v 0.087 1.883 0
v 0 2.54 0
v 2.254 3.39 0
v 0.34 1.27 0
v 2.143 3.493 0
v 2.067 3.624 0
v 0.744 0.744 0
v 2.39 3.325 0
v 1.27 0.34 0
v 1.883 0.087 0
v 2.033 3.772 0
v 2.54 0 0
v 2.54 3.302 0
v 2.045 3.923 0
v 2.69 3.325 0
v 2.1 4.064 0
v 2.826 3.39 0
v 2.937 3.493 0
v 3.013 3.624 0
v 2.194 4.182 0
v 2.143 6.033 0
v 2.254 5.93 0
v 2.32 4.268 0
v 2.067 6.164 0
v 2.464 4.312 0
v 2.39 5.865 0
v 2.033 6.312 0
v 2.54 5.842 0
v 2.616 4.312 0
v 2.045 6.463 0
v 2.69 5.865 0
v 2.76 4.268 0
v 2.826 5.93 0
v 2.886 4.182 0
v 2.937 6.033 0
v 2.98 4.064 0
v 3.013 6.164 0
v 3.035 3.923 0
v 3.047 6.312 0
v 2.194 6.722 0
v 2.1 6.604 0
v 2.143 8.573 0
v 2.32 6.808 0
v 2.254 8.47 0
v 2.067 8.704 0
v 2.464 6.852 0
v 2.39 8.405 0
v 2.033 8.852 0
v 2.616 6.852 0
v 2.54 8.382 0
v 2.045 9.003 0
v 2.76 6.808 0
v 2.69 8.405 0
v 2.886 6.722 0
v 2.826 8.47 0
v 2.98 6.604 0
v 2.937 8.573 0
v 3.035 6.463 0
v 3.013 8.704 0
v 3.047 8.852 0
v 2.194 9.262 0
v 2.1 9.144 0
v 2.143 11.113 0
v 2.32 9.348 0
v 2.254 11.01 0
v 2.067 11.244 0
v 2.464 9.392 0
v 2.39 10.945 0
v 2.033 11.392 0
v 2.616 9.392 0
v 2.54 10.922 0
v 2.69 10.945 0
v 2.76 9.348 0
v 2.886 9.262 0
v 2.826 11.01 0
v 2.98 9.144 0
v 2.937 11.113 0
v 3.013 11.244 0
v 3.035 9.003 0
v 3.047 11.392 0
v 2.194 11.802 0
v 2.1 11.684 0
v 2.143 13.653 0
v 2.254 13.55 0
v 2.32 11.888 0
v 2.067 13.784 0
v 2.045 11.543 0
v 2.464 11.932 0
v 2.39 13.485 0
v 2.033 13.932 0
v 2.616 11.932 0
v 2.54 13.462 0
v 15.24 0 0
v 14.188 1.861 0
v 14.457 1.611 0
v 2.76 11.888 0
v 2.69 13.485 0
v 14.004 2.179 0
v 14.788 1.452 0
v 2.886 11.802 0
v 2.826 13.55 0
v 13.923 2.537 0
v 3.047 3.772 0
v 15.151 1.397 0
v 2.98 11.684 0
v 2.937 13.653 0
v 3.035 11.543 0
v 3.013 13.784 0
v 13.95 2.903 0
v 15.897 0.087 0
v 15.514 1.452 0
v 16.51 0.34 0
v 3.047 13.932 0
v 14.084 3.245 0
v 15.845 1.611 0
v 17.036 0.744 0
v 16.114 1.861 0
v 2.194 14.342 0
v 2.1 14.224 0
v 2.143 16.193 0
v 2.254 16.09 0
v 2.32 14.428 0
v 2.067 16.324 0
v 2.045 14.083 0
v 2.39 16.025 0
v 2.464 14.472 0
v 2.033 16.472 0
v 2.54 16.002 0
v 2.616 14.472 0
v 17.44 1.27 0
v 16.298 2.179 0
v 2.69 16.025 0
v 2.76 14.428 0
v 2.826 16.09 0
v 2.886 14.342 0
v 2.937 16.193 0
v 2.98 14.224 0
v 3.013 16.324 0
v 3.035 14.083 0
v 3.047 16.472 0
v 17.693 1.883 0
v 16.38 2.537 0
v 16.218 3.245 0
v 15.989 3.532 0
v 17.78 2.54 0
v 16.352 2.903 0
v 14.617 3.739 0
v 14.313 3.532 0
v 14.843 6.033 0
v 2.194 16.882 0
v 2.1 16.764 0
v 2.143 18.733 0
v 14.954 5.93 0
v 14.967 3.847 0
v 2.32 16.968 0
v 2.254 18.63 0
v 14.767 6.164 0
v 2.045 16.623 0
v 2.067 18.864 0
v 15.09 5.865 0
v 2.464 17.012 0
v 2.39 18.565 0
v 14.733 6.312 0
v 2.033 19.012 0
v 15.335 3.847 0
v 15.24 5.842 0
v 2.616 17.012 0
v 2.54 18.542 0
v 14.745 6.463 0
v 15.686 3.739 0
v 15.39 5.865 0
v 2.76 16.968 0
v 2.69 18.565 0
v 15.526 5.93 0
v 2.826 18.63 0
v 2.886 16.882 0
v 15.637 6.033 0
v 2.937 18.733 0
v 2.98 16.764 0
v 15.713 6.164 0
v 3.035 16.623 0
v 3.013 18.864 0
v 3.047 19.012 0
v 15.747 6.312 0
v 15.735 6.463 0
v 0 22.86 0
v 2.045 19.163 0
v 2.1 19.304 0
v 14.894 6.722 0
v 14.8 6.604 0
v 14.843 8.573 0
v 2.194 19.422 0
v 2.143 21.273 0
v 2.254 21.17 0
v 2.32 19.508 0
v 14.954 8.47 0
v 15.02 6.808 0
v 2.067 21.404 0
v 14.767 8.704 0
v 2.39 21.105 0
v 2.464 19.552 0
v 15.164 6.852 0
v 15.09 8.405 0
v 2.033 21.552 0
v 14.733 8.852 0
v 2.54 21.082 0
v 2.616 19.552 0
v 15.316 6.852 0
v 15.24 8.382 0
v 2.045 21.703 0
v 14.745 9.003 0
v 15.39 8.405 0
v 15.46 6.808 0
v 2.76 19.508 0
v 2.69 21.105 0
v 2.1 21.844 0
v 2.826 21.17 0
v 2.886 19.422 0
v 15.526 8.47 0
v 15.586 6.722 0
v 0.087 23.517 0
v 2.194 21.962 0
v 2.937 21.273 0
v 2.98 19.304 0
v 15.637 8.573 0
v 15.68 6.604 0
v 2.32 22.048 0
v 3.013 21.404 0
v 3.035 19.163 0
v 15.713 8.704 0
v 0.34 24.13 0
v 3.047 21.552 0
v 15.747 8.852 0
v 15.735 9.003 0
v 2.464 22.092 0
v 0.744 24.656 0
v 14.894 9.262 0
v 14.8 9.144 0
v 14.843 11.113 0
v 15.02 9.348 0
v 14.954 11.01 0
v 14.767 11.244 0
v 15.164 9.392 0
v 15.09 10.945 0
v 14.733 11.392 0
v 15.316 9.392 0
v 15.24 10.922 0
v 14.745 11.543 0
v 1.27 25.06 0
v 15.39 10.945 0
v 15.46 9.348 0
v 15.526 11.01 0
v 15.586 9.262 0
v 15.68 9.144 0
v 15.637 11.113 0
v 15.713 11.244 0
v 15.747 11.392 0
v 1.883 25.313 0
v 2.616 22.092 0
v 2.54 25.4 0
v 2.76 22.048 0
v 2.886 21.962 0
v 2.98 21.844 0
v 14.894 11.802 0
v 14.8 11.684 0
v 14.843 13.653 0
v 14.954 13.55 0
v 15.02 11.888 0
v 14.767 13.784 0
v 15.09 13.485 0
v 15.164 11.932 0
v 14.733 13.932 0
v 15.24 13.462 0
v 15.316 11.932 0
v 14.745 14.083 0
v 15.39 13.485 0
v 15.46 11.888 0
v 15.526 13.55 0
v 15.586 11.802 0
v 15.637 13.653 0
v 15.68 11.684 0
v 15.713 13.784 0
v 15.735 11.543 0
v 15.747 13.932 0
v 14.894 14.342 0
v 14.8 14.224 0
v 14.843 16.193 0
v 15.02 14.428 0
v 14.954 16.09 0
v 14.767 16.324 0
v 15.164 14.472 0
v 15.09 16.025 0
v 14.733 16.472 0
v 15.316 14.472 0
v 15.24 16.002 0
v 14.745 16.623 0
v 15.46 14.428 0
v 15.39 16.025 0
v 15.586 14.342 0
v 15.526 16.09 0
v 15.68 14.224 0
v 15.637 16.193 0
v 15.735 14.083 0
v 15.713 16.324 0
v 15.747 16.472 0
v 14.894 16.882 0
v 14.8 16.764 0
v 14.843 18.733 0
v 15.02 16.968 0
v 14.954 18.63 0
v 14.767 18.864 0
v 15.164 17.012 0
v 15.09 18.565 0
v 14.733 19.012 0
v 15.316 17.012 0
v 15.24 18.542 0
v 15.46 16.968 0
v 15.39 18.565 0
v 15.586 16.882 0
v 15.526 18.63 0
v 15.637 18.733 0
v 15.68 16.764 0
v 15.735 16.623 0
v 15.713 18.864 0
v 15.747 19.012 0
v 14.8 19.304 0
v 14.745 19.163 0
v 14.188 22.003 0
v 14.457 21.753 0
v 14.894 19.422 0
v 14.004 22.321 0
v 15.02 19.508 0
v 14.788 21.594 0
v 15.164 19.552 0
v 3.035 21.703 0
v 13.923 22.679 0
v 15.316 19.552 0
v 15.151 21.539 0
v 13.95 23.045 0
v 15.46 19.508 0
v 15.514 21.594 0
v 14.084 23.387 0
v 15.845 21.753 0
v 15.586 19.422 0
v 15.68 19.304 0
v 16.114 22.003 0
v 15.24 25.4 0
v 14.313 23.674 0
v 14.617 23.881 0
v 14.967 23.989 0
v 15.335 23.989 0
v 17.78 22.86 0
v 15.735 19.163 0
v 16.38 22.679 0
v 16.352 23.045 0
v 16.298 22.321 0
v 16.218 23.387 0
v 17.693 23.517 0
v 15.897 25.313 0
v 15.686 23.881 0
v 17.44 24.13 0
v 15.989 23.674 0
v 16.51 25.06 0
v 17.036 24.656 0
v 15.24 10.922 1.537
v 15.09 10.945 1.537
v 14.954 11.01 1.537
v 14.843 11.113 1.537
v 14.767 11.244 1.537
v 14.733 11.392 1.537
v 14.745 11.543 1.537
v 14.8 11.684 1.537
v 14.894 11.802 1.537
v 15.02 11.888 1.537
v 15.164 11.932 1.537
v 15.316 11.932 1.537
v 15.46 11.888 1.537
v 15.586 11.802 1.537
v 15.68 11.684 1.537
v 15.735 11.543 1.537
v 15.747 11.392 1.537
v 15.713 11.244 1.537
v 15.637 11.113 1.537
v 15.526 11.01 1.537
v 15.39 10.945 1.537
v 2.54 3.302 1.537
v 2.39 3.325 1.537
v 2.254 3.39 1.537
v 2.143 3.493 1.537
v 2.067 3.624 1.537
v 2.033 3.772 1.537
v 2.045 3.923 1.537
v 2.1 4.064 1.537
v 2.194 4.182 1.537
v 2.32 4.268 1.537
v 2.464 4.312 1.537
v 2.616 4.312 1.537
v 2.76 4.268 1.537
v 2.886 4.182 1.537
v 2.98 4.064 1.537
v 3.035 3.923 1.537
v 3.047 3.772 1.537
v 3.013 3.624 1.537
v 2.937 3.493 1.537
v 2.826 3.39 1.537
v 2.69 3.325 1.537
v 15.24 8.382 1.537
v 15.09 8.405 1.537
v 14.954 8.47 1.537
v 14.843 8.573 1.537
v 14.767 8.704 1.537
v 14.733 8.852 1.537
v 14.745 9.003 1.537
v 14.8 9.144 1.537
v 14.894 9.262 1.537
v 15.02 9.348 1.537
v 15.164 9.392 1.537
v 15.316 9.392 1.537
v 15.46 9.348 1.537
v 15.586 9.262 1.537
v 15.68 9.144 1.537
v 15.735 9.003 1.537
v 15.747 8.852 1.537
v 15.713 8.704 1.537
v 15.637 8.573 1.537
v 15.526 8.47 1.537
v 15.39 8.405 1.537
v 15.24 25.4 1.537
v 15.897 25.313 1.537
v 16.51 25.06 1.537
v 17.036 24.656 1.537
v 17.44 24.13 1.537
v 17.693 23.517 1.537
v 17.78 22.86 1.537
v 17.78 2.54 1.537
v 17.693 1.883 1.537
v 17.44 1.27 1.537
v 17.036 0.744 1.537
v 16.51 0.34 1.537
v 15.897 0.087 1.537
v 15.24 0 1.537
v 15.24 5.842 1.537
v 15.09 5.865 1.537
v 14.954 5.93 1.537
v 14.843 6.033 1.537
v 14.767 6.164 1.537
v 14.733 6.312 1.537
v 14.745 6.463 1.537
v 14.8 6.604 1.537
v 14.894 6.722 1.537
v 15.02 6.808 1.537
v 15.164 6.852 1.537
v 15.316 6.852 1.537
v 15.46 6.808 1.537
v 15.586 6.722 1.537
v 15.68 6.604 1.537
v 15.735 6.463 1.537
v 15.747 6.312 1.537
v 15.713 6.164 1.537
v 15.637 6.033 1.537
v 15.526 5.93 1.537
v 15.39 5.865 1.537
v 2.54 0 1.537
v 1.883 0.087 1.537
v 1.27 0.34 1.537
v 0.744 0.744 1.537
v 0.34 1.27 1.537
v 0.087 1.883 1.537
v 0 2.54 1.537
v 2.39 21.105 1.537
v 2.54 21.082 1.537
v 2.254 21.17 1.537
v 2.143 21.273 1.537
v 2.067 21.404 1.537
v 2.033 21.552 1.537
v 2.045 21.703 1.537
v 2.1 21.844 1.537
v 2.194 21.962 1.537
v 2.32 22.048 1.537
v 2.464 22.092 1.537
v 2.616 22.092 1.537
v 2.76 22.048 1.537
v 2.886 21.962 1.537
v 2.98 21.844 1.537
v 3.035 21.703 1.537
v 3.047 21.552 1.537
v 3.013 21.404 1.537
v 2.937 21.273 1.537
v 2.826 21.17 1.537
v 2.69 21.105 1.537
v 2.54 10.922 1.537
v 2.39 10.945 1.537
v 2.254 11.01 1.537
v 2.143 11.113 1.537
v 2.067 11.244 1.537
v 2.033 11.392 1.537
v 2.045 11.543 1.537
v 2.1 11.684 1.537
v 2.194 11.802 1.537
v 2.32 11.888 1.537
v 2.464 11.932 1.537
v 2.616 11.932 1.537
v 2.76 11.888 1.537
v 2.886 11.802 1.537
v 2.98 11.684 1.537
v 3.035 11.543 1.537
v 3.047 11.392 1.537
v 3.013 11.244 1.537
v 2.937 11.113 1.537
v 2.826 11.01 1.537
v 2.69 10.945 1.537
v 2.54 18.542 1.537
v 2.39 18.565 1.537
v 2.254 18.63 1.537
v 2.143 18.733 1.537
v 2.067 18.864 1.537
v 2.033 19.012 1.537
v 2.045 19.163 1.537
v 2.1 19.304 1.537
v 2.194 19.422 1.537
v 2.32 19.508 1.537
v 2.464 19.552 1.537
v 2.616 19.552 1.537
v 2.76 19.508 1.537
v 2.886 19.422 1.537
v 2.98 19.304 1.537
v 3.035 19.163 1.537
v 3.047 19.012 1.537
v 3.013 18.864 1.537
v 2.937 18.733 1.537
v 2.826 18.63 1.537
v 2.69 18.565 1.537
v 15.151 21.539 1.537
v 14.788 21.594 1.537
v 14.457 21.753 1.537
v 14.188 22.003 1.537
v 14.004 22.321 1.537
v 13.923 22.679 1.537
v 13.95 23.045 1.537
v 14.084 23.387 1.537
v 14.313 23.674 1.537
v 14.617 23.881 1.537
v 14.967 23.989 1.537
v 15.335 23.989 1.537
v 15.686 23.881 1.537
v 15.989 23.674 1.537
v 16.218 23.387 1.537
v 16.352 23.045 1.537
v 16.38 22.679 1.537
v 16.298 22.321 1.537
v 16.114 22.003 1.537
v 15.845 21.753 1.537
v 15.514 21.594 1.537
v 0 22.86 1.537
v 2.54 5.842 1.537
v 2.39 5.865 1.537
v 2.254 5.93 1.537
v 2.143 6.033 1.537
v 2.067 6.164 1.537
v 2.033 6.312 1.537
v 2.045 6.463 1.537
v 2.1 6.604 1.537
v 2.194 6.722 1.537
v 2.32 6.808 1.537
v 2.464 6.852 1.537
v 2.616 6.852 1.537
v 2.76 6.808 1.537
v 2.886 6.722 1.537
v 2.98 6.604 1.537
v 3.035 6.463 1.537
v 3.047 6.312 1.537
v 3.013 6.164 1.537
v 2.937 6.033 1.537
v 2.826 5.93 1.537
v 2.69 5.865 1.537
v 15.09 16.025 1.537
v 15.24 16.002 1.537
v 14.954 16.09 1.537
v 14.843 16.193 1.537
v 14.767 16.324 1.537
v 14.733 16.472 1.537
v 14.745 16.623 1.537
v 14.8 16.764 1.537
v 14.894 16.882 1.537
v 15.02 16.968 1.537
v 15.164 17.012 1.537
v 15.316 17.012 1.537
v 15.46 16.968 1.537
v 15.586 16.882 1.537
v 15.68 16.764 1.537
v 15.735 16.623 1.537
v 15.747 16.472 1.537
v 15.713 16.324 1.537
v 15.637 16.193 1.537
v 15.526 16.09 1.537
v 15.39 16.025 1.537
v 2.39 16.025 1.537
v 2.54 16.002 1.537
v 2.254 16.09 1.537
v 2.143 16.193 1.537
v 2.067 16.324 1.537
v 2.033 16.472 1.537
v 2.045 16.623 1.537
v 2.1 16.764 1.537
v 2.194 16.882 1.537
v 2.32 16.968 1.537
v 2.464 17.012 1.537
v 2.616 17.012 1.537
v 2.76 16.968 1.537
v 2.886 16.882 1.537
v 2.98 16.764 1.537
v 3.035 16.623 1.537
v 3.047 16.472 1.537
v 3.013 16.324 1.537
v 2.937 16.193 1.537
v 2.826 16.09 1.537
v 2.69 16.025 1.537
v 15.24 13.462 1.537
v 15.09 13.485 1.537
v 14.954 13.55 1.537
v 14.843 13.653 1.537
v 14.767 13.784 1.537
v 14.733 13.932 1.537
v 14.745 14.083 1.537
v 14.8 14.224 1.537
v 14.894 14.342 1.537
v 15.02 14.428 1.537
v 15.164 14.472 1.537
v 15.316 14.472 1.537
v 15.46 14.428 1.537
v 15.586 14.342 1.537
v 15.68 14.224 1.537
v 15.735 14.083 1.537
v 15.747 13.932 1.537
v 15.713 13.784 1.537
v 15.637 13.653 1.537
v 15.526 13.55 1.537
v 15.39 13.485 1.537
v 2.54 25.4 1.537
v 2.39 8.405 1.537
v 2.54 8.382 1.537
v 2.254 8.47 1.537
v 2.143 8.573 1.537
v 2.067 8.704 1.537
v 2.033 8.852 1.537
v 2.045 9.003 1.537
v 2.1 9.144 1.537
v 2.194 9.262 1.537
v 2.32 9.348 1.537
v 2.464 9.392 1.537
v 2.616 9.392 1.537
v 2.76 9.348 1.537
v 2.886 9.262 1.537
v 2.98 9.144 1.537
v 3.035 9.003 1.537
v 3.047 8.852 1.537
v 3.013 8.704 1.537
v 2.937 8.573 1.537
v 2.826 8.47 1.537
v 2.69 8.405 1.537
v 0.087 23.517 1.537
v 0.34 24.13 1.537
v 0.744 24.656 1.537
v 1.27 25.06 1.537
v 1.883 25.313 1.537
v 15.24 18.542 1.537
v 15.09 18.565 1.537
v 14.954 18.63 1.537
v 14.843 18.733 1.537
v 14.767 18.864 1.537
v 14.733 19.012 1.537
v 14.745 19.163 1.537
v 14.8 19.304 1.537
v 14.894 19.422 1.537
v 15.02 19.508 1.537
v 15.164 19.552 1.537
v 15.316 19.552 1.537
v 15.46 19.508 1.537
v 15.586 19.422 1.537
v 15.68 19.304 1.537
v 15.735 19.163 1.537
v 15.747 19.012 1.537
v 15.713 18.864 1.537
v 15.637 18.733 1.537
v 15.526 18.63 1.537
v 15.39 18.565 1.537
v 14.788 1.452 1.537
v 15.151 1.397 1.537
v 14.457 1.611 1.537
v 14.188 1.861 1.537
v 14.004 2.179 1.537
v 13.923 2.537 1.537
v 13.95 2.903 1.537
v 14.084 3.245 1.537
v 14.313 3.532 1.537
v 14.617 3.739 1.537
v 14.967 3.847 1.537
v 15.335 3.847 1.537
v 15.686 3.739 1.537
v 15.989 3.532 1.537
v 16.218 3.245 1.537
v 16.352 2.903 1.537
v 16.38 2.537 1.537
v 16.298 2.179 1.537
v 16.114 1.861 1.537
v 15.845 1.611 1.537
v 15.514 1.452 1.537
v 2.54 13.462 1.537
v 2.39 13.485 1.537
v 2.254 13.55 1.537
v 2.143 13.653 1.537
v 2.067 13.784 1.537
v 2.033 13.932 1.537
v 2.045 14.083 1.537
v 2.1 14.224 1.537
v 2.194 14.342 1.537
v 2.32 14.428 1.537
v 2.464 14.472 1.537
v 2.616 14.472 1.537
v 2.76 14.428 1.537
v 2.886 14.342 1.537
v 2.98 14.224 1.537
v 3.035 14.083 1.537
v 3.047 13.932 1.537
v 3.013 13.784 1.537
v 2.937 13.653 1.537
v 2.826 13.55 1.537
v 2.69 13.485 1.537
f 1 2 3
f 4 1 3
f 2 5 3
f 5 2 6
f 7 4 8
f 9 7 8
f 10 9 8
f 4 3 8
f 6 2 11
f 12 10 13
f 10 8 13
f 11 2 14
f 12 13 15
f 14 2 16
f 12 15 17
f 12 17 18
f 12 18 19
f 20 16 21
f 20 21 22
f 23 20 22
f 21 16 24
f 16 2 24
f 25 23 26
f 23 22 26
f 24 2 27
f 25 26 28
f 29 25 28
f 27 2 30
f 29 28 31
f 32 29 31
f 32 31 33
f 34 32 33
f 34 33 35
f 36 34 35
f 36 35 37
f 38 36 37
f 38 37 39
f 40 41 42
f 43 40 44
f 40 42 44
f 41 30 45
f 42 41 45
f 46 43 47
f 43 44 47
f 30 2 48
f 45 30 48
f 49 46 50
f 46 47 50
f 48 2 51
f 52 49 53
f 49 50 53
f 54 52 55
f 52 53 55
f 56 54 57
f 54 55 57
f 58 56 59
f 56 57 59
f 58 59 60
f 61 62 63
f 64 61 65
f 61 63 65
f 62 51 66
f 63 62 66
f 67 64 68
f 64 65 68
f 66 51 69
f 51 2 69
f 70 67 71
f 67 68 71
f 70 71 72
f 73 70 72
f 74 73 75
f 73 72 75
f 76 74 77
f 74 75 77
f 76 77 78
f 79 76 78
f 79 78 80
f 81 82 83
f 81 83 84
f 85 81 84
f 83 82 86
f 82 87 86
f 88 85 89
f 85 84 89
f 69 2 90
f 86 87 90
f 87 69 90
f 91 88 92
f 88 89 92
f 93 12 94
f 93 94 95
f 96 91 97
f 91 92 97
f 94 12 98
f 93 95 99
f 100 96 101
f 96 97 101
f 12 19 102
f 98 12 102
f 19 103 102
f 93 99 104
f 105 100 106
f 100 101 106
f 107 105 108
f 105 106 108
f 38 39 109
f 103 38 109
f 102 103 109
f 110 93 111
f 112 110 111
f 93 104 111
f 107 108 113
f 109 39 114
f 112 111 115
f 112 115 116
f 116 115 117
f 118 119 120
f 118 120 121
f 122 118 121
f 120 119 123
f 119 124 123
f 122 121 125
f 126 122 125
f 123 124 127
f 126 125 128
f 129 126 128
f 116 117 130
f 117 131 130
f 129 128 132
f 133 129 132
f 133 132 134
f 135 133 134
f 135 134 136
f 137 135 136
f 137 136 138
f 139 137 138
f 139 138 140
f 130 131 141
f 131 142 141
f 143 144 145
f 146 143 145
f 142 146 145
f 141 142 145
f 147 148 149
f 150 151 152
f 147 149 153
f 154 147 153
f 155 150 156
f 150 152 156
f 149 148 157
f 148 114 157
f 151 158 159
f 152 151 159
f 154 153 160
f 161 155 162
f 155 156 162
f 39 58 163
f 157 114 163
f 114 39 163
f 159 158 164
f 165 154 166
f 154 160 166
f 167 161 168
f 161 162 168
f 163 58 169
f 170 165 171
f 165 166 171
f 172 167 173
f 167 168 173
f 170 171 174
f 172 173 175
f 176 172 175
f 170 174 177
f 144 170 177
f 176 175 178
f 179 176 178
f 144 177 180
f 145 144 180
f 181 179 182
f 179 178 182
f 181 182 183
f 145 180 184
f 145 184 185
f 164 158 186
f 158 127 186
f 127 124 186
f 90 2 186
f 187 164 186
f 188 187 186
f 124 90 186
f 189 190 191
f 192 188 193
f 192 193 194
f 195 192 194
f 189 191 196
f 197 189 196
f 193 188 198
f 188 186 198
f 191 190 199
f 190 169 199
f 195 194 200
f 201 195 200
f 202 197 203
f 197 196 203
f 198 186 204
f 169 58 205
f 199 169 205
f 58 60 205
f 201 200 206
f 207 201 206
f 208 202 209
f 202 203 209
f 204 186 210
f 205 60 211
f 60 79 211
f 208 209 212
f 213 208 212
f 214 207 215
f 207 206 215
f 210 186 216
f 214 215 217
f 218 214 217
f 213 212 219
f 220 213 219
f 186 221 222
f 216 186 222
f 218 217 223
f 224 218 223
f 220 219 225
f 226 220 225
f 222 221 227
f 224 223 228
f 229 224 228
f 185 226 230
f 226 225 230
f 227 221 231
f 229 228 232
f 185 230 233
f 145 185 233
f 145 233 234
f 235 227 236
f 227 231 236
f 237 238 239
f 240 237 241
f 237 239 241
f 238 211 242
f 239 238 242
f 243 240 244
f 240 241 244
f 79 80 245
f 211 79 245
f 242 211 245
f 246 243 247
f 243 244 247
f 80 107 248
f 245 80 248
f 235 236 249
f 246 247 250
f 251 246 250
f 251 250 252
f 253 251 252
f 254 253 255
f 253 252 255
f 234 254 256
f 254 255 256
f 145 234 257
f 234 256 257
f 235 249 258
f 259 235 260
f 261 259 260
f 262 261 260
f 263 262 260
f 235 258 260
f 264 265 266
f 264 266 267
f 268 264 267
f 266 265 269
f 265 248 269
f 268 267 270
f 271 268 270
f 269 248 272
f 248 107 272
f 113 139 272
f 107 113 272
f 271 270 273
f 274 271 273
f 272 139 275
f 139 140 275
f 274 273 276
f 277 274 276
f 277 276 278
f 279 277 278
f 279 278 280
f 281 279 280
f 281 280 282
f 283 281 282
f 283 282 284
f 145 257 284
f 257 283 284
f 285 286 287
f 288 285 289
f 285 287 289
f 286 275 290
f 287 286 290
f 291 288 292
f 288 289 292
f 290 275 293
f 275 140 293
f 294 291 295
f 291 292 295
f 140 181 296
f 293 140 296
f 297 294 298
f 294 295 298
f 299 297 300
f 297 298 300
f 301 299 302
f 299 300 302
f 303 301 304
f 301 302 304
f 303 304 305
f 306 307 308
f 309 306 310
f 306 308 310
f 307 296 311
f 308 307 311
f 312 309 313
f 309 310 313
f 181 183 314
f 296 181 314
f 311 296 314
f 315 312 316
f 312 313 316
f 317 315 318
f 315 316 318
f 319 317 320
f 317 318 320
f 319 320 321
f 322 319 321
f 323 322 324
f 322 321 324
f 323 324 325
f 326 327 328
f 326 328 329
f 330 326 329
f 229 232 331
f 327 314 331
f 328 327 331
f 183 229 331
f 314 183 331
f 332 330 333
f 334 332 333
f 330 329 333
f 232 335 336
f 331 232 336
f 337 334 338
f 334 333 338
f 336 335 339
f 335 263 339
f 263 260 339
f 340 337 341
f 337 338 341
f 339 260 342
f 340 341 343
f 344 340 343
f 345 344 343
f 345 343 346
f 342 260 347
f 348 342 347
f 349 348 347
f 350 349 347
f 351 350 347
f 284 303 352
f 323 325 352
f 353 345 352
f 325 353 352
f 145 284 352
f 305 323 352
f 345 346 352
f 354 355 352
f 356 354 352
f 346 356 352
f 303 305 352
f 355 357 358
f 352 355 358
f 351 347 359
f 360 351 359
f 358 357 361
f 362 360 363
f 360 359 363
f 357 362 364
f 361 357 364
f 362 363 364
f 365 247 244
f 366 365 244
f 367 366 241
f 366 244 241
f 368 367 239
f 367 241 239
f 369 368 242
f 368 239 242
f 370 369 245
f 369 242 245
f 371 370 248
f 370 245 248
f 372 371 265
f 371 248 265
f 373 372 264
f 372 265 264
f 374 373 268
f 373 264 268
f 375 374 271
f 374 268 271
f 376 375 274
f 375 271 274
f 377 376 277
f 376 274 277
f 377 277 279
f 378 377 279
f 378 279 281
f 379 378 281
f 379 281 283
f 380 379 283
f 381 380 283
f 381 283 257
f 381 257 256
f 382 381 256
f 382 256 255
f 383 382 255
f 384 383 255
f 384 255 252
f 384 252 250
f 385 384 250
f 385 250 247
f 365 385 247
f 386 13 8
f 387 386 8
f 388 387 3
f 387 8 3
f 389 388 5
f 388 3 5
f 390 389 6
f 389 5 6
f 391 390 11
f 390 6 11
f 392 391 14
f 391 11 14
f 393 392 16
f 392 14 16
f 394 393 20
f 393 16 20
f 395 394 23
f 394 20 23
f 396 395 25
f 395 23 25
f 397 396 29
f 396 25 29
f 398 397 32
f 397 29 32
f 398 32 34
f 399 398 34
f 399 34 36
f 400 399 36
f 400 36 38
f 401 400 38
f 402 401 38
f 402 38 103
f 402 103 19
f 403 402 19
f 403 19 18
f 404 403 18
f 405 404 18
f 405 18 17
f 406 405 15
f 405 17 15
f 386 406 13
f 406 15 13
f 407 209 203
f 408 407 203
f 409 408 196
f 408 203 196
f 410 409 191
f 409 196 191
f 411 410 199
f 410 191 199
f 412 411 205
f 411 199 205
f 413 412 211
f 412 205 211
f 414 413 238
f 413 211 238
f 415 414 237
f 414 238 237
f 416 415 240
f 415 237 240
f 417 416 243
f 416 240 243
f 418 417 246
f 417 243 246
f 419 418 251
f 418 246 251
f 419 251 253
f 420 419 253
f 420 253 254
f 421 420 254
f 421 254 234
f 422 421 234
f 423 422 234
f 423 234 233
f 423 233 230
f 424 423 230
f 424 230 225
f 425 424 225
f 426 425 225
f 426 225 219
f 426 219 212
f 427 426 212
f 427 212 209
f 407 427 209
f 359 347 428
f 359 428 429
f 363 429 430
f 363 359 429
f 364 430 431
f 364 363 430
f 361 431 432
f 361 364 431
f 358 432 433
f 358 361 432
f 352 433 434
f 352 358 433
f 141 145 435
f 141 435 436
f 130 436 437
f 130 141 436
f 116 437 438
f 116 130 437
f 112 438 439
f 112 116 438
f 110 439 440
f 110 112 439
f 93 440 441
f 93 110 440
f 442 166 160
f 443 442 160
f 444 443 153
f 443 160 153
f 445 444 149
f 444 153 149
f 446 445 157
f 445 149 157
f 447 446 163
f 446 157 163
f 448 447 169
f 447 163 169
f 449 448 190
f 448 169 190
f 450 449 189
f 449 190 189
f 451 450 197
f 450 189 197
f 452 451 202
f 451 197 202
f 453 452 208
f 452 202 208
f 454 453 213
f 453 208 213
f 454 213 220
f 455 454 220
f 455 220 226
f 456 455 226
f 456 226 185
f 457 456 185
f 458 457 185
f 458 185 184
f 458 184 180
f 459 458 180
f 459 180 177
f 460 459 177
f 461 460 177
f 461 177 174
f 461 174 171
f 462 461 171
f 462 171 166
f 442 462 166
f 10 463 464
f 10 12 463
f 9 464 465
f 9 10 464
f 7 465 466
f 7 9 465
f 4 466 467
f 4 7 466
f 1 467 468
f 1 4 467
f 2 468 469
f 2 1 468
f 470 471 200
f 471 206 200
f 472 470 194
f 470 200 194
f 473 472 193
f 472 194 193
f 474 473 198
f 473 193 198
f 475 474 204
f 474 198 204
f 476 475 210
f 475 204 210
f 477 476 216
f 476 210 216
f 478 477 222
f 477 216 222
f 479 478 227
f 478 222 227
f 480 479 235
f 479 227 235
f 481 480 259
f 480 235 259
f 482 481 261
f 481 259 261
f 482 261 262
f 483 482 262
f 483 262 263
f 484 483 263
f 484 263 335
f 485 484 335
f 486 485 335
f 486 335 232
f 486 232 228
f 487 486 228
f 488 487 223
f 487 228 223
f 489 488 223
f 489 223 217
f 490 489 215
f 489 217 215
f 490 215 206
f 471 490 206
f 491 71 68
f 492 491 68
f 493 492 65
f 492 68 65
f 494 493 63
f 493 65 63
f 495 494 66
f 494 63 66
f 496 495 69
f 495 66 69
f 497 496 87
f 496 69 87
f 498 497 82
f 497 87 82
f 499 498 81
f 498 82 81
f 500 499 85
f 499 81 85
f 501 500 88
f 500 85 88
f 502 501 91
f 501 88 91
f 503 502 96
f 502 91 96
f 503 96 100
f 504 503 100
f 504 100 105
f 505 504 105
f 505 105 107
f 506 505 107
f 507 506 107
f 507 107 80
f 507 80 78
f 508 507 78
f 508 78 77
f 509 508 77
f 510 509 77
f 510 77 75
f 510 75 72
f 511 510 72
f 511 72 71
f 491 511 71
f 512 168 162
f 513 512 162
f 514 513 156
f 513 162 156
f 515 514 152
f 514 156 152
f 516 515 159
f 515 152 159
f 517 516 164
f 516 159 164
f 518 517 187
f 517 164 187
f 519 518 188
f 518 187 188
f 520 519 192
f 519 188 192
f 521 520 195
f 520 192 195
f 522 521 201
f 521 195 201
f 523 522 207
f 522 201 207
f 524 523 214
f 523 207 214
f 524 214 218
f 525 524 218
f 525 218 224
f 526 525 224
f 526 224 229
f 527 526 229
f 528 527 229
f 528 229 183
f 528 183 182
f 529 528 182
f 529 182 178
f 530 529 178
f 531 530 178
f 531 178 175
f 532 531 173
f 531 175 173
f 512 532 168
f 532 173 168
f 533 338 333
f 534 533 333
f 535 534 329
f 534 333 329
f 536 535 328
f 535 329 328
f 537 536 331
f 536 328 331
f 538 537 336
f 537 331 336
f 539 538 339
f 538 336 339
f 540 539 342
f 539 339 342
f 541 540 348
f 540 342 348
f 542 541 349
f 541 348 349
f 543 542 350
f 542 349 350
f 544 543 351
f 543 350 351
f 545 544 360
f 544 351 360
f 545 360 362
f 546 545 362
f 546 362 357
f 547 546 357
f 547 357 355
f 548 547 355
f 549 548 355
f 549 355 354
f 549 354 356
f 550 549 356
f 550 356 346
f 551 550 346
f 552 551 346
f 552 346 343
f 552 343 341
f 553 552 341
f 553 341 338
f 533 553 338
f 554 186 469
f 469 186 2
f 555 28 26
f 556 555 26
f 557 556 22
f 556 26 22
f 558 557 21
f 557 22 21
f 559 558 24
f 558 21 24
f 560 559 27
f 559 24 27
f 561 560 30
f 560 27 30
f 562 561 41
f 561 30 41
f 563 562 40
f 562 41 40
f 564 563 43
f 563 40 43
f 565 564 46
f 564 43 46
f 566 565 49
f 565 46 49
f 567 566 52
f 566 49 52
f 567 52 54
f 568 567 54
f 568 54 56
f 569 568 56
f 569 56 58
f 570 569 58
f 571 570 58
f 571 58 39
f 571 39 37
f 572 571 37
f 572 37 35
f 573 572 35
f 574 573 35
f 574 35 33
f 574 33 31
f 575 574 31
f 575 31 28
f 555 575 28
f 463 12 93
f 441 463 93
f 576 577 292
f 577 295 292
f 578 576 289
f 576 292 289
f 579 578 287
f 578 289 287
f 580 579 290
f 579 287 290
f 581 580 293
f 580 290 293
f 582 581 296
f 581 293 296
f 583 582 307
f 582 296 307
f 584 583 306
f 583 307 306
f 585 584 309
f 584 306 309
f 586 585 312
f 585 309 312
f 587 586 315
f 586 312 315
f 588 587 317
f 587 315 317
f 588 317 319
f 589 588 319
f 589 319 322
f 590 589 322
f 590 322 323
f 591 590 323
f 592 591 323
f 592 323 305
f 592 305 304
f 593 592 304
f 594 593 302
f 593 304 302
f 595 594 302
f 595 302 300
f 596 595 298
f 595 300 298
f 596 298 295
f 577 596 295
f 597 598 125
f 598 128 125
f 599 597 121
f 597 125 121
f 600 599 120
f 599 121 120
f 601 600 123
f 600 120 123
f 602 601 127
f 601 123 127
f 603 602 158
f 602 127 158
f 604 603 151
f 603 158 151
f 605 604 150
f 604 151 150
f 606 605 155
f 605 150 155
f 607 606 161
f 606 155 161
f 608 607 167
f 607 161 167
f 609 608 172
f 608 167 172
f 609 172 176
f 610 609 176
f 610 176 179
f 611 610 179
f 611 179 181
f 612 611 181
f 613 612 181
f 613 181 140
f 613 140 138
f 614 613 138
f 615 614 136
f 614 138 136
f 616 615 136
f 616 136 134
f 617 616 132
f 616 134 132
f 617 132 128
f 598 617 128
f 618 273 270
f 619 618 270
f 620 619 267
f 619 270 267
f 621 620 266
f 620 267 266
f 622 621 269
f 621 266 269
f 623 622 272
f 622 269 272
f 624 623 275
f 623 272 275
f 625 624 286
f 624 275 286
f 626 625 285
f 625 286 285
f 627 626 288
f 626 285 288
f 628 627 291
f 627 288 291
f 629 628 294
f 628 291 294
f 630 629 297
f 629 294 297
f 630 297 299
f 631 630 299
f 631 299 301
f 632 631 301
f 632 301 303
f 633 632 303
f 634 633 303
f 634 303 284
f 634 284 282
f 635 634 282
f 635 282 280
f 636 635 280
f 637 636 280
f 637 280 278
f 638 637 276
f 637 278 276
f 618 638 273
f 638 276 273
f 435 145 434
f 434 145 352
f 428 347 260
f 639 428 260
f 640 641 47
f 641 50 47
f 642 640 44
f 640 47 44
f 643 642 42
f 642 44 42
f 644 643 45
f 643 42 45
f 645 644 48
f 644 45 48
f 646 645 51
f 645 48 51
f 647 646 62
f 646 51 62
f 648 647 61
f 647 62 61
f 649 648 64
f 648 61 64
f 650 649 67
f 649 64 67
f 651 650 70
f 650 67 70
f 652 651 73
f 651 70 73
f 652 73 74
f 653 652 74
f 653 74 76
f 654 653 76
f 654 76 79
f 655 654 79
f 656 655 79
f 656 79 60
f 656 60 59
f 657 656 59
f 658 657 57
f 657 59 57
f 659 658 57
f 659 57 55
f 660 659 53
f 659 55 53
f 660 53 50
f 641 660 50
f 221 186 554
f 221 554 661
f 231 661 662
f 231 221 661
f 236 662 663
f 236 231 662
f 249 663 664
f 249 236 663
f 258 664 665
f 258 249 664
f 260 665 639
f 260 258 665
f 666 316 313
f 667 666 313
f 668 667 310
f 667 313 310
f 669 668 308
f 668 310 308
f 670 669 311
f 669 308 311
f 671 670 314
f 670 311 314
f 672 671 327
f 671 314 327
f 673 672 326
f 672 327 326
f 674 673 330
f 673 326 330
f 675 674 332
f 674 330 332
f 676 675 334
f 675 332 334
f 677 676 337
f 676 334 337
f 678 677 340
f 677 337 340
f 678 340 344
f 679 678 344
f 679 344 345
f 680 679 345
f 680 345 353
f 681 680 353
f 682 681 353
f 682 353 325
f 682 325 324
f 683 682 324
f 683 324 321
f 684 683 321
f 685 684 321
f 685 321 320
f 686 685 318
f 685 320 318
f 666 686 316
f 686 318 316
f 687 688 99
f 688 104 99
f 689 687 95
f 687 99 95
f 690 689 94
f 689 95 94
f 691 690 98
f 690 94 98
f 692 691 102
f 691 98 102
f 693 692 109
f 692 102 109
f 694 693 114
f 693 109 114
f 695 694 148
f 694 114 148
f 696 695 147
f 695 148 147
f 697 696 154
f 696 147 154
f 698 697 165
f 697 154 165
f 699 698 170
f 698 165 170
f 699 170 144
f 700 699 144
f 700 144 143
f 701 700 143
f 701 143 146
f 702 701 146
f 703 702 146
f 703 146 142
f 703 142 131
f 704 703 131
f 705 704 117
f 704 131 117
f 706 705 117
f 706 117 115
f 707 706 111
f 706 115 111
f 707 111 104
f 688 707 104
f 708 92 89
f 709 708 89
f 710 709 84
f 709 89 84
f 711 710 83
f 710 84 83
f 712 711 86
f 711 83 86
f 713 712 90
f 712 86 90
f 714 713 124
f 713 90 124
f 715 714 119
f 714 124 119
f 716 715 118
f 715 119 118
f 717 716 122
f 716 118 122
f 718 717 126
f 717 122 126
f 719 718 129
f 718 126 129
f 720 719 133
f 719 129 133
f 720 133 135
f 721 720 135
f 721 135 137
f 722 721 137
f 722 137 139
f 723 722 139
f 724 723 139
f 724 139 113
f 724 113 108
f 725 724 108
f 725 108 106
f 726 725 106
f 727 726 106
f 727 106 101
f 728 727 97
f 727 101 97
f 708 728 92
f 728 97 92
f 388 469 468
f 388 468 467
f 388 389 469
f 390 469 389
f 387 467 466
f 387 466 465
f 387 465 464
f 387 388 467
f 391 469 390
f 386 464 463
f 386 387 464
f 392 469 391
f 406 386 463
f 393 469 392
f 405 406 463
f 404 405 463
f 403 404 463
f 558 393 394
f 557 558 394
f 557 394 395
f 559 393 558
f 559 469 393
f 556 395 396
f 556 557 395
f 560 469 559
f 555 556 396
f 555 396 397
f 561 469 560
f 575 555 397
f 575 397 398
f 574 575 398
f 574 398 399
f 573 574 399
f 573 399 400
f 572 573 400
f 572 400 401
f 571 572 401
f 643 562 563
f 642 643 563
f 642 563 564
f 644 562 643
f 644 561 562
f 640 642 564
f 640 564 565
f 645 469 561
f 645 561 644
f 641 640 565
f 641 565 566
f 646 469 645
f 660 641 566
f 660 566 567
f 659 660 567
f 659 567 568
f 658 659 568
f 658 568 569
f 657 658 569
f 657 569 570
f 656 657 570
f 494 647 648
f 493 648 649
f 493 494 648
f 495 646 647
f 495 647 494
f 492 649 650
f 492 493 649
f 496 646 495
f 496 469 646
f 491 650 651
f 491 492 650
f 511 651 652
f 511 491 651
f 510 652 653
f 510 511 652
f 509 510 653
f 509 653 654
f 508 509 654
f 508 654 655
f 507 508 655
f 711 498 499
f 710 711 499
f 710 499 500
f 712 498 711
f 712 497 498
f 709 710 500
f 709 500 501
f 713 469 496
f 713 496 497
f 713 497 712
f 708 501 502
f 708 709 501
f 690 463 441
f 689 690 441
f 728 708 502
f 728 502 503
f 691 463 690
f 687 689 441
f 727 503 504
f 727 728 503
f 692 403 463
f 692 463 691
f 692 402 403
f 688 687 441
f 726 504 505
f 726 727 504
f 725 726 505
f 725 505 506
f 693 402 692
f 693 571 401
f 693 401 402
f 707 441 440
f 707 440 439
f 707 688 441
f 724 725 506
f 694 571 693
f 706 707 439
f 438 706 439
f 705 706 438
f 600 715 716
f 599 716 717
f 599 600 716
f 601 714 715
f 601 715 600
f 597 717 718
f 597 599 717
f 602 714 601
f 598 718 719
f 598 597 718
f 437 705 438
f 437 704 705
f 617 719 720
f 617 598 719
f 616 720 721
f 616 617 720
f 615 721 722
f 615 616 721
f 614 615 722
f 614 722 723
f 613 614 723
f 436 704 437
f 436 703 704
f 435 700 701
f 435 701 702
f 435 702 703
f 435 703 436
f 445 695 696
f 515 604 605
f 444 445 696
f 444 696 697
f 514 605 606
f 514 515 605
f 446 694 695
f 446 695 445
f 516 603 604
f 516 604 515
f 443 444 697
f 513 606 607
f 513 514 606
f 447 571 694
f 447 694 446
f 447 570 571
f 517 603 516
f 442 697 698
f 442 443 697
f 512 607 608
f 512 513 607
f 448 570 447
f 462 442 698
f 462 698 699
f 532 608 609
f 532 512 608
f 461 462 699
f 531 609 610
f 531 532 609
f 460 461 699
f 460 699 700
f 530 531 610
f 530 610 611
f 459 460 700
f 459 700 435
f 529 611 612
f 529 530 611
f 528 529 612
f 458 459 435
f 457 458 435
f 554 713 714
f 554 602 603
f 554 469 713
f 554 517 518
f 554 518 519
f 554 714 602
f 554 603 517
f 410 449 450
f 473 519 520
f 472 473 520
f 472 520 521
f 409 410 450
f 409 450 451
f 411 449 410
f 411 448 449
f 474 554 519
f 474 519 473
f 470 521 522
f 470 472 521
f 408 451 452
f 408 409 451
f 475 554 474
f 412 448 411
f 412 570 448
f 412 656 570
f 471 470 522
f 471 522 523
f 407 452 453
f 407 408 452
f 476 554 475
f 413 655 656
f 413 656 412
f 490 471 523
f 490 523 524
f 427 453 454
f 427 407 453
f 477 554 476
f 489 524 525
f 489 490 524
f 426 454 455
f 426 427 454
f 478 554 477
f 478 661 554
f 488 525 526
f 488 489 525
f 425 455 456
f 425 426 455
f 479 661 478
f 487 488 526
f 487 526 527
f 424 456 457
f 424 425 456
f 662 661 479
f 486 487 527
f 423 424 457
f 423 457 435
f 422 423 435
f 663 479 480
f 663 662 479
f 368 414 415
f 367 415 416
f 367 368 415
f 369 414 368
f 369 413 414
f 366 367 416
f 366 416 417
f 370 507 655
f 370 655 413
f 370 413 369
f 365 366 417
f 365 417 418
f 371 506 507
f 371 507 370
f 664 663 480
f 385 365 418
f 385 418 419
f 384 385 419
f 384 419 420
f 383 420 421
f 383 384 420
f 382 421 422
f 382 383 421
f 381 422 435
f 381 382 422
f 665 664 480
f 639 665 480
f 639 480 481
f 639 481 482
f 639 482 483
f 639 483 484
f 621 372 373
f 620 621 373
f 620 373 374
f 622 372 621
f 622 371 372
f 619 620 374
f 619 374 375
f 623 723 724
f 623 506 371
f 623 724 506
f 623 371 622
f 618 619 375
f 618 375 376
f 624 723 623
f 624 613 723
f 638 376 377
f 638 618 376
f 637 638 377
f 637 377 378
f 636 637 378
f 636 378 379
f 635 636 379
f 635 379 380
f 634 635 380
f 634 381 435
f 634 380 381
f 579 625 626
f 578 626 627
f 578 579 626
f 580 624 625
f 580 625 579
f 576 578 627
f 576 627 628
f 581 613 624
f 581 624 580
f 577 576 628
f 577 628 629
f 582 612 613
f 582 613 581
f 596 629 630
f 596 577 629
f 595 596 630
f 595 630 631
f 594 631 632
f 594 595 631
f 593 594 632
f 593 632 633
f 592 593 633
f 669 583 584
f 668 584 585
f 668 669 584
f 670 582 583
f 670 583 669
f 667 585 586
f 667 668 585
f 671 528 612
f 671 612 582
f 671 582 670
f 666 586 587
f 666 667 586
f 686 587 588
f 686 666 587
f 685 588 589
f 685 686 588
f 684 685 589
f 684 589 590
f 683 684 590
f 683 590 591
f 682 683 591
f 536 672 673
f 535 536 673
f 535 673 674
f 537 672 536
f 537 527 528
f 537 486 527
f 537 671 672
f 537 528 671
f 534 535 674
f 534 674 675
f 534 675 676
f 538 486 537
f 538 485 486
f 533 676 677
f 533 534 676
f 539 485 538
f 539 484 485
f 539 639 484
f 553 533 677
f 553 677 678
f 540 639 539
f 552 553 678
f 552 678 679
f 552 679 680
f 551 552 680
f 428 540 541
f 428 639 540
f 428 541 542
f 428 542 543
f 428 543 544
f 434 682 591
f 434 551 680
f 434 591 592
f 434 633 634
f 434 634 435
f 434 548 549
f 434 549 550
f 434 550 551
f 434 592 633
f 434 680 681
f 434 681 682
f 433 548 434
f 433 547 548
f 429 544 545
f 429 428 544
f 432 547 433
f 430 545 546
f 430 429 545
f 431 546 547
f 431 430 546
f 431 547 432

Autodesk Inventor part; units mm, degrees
ref_plane "YZ Plane" through (0, 0, 0) normal (1, 0, 0) x (0, 1, 0)
ref_plane "XZ Plane" through (0, 0, 0) normal (0, 1, 0) x (-1, 0, 0)
ref_plane "XY Plane" through (0, 0, 0) normal (0, 0, 1) x (1, 0, 0)
sketch "Sketch1" plane through (0, 0, 0) normal (0, 0, 1) x (1, 0, 0)
  line L0 (2.54, 0) -> (15.24, 0)
  line L1 (17.78, 2.54) -> (17.78, 22.86)
  line L2 (15.24, 25.4) -> (2.54, 25.4)
  line L3 (0, 22.86) -> (0, 2.54)
  arc A0 (17.78, 22.86) -> (15.24, 25.4) centre (15.24, 22.86) ccw
  arc A1 (15.24, 0) -> (17.78, 2.54) centre (15.24, 2.54) ccw
  arc A2 (0, 2.54) -> (2.54, 0) centre (2.54, 2.54) ccw
  arc A3 (2.54, 25.4) -> (0, 22.86) centre (2.54, 22.86) ccw
  point P0 (0, 0)
  point P1 (17.78, 25.4)
  point P2 (17.78, 0)
  point P3 (0, 25.4)
  dimension "d0" = 17.78
  dimension "d1" = 25.4
  dimension "d2" = 2.54
extrude "Extrusion1" add sketch "Sketch1" along normal blind 1.5367
sketch "Sketch2" plane through (0, 0, 1.5367) normal (0, 0, 1) x (1, 0, 0)
  arc A0 (17.78, 22.86) -> (15.24, 25.4) centre (15.24, 22.86) ccw projected
  arc A1 (15.24, 0) -> (17.78, 2.54) centre (15.24, 2.54) ccw projected
  line L0 (17.78, 2.54) -> (17.78, 22.86) projected
  line L1 (15.24, 25.4) -> (2.54, 25.4) projected
  line L2 (2.54, 0) -> (15.24, 0) projected
  point P0 (0, 0)
  point P1 (15.1511, 22.7711)
  point P2 (15.1511, 2.6289)
  dimension "d36" = 2.6289
  dimension "d37" = 2.6289
  dimension "d38" = 2.6289
  dimension "d39" = 2.6289
hole "Hole1" at (15.1511, 22.7711, 1.5367) at (15.1511, 2.6289, 1.5367) direction (0, 0, -1) diameter 2.4638 end through all both
sketch "Sketch3" plane through (0, 0, 1.5367) normal (0, 0, 1) x (1, 0, 0)
  arc A0 (17.78, 22.86) -> (15.24, 25.4) centre (15.24, 22.86) ccw construction
  line L0 (15.24, 25.4) -> (15.24, 0) construction
  arc A1 (15.24, 0) -> (17.78, 2.54) centre (15.24, 2.54) ccw construction
  line L1 (2.54, 0) -> (15.24, 0) construction
  line L2 (15.24, 25.4) -> (2.54, 25.4) construction
  line L3 (2.54, 0) -> (2.54, 25.4) construction
  line L4 (0, 22.86) -> (0, 2.54) construction
  line L5 (0, 12.7) -> (17.78, 12.7) construction
  line L6 (17.78, 2.54) -> (17.78, 22.86) construction
  line L7 (8.89, 25.4) -> (8.89, 0) construction
  point P0 (0, 0)
  point P1 (15.24, 13.97)
  point P2 (2.54, 13.97)
  point P3 (15.24, 16.51)
  point P4 (15.24, 19.05)
  point P5 (15.24, 11.43)
  point P6 (15.24, 13.97)
  point P7 (15.24, 16.51)
  point P8 (15.24, 8.89)
  point P9 (15.24, 11.43)
  point P10 (15.24, 13.97)
  point P11 (15.24, 6.35)
  point P12 (15.24, 8.89)
  point P13 (15.24, 11.43)
  point P14 (2.54, 16.51)
  point P15 (2.54, 19.05)
  point P16 (2.54, 21.59)
  point P17 (2.54, 11.43)
  point P18 (2.54, 13.97)
  point P19 (2.54, 16.51)
  point P20 (2.54, 19.05)
  point P21 (2.54, 8.89)
  point P22 (2.54, 11.43)
  point P23 (2.54, 13.97)
  point P24 (2.54, 16.51)
  point P25 (2.54, 6.35)
  point P26 (2.54, 8.89)
  point P27 (2.54, 11.43)
  point P28 (2.54, 13.97)
  point P29 (2.54, 3.81)
  point P30 (2.54, 6.35)
  point P31 (2.54, 8.89)
  point P32 (2.54, 11.43)
  dimension "d12" = 1.27
  dimension "d15" = 2.54
  dimension "d18" = 2.54
  dimension "d23" = 2.54
  dimension "d26" = 2.54
hole "Hole2" at (15.24, 13.97, 1.5367) at (2.54, 13.97, 1.5367) at (15.24, 16.51, 1.5367) at (15.24, 19.05, 1.5367) at (15.24, 11.43, 1.5367) at (15.24, 8.89, 1.5367) at (15.24, 6.35, 1.5367) at (2.54, 16.51, 1.5367) at (2.54, 19.05, 1.5367) at (2.54, 21.59, 1.5367) at (2.54, 11.43, 1.5367) at (2.54, 8.89, 1.5367) at (2.54, 6.35, 1.5367) at (2.54, 3.81, 1.5367) direction (0, 0, -1) diameter 1.016 end through all both
equation "\"d3\" = pcbThickness"
equation "\"d5\" = mountingHoleDiameter"
equation "\"d12\" = 0.5 * pinHoleSeparationDistance"
equation "\"d15\" = pinHoleSeparationDistance"
equation "\"d18\" = pinHoleSeparationDistance"
equation "\"d23\" = pinHoleSeparationDistance"
equation "\"d26\" = pinHoleSeparationDistance"
equation "\"d29\" = pinHoleDiameter"
equation "\"pcbThickness\" = 1.5367"
equation "\"mountingHoleDiameter\" = 2.4638"
equation "\"pinHoleDiameter\" = 1.016"
equation "\"pinHoleSeparationDistance\" = 2.54"
properties part number "Driver_Motor"
